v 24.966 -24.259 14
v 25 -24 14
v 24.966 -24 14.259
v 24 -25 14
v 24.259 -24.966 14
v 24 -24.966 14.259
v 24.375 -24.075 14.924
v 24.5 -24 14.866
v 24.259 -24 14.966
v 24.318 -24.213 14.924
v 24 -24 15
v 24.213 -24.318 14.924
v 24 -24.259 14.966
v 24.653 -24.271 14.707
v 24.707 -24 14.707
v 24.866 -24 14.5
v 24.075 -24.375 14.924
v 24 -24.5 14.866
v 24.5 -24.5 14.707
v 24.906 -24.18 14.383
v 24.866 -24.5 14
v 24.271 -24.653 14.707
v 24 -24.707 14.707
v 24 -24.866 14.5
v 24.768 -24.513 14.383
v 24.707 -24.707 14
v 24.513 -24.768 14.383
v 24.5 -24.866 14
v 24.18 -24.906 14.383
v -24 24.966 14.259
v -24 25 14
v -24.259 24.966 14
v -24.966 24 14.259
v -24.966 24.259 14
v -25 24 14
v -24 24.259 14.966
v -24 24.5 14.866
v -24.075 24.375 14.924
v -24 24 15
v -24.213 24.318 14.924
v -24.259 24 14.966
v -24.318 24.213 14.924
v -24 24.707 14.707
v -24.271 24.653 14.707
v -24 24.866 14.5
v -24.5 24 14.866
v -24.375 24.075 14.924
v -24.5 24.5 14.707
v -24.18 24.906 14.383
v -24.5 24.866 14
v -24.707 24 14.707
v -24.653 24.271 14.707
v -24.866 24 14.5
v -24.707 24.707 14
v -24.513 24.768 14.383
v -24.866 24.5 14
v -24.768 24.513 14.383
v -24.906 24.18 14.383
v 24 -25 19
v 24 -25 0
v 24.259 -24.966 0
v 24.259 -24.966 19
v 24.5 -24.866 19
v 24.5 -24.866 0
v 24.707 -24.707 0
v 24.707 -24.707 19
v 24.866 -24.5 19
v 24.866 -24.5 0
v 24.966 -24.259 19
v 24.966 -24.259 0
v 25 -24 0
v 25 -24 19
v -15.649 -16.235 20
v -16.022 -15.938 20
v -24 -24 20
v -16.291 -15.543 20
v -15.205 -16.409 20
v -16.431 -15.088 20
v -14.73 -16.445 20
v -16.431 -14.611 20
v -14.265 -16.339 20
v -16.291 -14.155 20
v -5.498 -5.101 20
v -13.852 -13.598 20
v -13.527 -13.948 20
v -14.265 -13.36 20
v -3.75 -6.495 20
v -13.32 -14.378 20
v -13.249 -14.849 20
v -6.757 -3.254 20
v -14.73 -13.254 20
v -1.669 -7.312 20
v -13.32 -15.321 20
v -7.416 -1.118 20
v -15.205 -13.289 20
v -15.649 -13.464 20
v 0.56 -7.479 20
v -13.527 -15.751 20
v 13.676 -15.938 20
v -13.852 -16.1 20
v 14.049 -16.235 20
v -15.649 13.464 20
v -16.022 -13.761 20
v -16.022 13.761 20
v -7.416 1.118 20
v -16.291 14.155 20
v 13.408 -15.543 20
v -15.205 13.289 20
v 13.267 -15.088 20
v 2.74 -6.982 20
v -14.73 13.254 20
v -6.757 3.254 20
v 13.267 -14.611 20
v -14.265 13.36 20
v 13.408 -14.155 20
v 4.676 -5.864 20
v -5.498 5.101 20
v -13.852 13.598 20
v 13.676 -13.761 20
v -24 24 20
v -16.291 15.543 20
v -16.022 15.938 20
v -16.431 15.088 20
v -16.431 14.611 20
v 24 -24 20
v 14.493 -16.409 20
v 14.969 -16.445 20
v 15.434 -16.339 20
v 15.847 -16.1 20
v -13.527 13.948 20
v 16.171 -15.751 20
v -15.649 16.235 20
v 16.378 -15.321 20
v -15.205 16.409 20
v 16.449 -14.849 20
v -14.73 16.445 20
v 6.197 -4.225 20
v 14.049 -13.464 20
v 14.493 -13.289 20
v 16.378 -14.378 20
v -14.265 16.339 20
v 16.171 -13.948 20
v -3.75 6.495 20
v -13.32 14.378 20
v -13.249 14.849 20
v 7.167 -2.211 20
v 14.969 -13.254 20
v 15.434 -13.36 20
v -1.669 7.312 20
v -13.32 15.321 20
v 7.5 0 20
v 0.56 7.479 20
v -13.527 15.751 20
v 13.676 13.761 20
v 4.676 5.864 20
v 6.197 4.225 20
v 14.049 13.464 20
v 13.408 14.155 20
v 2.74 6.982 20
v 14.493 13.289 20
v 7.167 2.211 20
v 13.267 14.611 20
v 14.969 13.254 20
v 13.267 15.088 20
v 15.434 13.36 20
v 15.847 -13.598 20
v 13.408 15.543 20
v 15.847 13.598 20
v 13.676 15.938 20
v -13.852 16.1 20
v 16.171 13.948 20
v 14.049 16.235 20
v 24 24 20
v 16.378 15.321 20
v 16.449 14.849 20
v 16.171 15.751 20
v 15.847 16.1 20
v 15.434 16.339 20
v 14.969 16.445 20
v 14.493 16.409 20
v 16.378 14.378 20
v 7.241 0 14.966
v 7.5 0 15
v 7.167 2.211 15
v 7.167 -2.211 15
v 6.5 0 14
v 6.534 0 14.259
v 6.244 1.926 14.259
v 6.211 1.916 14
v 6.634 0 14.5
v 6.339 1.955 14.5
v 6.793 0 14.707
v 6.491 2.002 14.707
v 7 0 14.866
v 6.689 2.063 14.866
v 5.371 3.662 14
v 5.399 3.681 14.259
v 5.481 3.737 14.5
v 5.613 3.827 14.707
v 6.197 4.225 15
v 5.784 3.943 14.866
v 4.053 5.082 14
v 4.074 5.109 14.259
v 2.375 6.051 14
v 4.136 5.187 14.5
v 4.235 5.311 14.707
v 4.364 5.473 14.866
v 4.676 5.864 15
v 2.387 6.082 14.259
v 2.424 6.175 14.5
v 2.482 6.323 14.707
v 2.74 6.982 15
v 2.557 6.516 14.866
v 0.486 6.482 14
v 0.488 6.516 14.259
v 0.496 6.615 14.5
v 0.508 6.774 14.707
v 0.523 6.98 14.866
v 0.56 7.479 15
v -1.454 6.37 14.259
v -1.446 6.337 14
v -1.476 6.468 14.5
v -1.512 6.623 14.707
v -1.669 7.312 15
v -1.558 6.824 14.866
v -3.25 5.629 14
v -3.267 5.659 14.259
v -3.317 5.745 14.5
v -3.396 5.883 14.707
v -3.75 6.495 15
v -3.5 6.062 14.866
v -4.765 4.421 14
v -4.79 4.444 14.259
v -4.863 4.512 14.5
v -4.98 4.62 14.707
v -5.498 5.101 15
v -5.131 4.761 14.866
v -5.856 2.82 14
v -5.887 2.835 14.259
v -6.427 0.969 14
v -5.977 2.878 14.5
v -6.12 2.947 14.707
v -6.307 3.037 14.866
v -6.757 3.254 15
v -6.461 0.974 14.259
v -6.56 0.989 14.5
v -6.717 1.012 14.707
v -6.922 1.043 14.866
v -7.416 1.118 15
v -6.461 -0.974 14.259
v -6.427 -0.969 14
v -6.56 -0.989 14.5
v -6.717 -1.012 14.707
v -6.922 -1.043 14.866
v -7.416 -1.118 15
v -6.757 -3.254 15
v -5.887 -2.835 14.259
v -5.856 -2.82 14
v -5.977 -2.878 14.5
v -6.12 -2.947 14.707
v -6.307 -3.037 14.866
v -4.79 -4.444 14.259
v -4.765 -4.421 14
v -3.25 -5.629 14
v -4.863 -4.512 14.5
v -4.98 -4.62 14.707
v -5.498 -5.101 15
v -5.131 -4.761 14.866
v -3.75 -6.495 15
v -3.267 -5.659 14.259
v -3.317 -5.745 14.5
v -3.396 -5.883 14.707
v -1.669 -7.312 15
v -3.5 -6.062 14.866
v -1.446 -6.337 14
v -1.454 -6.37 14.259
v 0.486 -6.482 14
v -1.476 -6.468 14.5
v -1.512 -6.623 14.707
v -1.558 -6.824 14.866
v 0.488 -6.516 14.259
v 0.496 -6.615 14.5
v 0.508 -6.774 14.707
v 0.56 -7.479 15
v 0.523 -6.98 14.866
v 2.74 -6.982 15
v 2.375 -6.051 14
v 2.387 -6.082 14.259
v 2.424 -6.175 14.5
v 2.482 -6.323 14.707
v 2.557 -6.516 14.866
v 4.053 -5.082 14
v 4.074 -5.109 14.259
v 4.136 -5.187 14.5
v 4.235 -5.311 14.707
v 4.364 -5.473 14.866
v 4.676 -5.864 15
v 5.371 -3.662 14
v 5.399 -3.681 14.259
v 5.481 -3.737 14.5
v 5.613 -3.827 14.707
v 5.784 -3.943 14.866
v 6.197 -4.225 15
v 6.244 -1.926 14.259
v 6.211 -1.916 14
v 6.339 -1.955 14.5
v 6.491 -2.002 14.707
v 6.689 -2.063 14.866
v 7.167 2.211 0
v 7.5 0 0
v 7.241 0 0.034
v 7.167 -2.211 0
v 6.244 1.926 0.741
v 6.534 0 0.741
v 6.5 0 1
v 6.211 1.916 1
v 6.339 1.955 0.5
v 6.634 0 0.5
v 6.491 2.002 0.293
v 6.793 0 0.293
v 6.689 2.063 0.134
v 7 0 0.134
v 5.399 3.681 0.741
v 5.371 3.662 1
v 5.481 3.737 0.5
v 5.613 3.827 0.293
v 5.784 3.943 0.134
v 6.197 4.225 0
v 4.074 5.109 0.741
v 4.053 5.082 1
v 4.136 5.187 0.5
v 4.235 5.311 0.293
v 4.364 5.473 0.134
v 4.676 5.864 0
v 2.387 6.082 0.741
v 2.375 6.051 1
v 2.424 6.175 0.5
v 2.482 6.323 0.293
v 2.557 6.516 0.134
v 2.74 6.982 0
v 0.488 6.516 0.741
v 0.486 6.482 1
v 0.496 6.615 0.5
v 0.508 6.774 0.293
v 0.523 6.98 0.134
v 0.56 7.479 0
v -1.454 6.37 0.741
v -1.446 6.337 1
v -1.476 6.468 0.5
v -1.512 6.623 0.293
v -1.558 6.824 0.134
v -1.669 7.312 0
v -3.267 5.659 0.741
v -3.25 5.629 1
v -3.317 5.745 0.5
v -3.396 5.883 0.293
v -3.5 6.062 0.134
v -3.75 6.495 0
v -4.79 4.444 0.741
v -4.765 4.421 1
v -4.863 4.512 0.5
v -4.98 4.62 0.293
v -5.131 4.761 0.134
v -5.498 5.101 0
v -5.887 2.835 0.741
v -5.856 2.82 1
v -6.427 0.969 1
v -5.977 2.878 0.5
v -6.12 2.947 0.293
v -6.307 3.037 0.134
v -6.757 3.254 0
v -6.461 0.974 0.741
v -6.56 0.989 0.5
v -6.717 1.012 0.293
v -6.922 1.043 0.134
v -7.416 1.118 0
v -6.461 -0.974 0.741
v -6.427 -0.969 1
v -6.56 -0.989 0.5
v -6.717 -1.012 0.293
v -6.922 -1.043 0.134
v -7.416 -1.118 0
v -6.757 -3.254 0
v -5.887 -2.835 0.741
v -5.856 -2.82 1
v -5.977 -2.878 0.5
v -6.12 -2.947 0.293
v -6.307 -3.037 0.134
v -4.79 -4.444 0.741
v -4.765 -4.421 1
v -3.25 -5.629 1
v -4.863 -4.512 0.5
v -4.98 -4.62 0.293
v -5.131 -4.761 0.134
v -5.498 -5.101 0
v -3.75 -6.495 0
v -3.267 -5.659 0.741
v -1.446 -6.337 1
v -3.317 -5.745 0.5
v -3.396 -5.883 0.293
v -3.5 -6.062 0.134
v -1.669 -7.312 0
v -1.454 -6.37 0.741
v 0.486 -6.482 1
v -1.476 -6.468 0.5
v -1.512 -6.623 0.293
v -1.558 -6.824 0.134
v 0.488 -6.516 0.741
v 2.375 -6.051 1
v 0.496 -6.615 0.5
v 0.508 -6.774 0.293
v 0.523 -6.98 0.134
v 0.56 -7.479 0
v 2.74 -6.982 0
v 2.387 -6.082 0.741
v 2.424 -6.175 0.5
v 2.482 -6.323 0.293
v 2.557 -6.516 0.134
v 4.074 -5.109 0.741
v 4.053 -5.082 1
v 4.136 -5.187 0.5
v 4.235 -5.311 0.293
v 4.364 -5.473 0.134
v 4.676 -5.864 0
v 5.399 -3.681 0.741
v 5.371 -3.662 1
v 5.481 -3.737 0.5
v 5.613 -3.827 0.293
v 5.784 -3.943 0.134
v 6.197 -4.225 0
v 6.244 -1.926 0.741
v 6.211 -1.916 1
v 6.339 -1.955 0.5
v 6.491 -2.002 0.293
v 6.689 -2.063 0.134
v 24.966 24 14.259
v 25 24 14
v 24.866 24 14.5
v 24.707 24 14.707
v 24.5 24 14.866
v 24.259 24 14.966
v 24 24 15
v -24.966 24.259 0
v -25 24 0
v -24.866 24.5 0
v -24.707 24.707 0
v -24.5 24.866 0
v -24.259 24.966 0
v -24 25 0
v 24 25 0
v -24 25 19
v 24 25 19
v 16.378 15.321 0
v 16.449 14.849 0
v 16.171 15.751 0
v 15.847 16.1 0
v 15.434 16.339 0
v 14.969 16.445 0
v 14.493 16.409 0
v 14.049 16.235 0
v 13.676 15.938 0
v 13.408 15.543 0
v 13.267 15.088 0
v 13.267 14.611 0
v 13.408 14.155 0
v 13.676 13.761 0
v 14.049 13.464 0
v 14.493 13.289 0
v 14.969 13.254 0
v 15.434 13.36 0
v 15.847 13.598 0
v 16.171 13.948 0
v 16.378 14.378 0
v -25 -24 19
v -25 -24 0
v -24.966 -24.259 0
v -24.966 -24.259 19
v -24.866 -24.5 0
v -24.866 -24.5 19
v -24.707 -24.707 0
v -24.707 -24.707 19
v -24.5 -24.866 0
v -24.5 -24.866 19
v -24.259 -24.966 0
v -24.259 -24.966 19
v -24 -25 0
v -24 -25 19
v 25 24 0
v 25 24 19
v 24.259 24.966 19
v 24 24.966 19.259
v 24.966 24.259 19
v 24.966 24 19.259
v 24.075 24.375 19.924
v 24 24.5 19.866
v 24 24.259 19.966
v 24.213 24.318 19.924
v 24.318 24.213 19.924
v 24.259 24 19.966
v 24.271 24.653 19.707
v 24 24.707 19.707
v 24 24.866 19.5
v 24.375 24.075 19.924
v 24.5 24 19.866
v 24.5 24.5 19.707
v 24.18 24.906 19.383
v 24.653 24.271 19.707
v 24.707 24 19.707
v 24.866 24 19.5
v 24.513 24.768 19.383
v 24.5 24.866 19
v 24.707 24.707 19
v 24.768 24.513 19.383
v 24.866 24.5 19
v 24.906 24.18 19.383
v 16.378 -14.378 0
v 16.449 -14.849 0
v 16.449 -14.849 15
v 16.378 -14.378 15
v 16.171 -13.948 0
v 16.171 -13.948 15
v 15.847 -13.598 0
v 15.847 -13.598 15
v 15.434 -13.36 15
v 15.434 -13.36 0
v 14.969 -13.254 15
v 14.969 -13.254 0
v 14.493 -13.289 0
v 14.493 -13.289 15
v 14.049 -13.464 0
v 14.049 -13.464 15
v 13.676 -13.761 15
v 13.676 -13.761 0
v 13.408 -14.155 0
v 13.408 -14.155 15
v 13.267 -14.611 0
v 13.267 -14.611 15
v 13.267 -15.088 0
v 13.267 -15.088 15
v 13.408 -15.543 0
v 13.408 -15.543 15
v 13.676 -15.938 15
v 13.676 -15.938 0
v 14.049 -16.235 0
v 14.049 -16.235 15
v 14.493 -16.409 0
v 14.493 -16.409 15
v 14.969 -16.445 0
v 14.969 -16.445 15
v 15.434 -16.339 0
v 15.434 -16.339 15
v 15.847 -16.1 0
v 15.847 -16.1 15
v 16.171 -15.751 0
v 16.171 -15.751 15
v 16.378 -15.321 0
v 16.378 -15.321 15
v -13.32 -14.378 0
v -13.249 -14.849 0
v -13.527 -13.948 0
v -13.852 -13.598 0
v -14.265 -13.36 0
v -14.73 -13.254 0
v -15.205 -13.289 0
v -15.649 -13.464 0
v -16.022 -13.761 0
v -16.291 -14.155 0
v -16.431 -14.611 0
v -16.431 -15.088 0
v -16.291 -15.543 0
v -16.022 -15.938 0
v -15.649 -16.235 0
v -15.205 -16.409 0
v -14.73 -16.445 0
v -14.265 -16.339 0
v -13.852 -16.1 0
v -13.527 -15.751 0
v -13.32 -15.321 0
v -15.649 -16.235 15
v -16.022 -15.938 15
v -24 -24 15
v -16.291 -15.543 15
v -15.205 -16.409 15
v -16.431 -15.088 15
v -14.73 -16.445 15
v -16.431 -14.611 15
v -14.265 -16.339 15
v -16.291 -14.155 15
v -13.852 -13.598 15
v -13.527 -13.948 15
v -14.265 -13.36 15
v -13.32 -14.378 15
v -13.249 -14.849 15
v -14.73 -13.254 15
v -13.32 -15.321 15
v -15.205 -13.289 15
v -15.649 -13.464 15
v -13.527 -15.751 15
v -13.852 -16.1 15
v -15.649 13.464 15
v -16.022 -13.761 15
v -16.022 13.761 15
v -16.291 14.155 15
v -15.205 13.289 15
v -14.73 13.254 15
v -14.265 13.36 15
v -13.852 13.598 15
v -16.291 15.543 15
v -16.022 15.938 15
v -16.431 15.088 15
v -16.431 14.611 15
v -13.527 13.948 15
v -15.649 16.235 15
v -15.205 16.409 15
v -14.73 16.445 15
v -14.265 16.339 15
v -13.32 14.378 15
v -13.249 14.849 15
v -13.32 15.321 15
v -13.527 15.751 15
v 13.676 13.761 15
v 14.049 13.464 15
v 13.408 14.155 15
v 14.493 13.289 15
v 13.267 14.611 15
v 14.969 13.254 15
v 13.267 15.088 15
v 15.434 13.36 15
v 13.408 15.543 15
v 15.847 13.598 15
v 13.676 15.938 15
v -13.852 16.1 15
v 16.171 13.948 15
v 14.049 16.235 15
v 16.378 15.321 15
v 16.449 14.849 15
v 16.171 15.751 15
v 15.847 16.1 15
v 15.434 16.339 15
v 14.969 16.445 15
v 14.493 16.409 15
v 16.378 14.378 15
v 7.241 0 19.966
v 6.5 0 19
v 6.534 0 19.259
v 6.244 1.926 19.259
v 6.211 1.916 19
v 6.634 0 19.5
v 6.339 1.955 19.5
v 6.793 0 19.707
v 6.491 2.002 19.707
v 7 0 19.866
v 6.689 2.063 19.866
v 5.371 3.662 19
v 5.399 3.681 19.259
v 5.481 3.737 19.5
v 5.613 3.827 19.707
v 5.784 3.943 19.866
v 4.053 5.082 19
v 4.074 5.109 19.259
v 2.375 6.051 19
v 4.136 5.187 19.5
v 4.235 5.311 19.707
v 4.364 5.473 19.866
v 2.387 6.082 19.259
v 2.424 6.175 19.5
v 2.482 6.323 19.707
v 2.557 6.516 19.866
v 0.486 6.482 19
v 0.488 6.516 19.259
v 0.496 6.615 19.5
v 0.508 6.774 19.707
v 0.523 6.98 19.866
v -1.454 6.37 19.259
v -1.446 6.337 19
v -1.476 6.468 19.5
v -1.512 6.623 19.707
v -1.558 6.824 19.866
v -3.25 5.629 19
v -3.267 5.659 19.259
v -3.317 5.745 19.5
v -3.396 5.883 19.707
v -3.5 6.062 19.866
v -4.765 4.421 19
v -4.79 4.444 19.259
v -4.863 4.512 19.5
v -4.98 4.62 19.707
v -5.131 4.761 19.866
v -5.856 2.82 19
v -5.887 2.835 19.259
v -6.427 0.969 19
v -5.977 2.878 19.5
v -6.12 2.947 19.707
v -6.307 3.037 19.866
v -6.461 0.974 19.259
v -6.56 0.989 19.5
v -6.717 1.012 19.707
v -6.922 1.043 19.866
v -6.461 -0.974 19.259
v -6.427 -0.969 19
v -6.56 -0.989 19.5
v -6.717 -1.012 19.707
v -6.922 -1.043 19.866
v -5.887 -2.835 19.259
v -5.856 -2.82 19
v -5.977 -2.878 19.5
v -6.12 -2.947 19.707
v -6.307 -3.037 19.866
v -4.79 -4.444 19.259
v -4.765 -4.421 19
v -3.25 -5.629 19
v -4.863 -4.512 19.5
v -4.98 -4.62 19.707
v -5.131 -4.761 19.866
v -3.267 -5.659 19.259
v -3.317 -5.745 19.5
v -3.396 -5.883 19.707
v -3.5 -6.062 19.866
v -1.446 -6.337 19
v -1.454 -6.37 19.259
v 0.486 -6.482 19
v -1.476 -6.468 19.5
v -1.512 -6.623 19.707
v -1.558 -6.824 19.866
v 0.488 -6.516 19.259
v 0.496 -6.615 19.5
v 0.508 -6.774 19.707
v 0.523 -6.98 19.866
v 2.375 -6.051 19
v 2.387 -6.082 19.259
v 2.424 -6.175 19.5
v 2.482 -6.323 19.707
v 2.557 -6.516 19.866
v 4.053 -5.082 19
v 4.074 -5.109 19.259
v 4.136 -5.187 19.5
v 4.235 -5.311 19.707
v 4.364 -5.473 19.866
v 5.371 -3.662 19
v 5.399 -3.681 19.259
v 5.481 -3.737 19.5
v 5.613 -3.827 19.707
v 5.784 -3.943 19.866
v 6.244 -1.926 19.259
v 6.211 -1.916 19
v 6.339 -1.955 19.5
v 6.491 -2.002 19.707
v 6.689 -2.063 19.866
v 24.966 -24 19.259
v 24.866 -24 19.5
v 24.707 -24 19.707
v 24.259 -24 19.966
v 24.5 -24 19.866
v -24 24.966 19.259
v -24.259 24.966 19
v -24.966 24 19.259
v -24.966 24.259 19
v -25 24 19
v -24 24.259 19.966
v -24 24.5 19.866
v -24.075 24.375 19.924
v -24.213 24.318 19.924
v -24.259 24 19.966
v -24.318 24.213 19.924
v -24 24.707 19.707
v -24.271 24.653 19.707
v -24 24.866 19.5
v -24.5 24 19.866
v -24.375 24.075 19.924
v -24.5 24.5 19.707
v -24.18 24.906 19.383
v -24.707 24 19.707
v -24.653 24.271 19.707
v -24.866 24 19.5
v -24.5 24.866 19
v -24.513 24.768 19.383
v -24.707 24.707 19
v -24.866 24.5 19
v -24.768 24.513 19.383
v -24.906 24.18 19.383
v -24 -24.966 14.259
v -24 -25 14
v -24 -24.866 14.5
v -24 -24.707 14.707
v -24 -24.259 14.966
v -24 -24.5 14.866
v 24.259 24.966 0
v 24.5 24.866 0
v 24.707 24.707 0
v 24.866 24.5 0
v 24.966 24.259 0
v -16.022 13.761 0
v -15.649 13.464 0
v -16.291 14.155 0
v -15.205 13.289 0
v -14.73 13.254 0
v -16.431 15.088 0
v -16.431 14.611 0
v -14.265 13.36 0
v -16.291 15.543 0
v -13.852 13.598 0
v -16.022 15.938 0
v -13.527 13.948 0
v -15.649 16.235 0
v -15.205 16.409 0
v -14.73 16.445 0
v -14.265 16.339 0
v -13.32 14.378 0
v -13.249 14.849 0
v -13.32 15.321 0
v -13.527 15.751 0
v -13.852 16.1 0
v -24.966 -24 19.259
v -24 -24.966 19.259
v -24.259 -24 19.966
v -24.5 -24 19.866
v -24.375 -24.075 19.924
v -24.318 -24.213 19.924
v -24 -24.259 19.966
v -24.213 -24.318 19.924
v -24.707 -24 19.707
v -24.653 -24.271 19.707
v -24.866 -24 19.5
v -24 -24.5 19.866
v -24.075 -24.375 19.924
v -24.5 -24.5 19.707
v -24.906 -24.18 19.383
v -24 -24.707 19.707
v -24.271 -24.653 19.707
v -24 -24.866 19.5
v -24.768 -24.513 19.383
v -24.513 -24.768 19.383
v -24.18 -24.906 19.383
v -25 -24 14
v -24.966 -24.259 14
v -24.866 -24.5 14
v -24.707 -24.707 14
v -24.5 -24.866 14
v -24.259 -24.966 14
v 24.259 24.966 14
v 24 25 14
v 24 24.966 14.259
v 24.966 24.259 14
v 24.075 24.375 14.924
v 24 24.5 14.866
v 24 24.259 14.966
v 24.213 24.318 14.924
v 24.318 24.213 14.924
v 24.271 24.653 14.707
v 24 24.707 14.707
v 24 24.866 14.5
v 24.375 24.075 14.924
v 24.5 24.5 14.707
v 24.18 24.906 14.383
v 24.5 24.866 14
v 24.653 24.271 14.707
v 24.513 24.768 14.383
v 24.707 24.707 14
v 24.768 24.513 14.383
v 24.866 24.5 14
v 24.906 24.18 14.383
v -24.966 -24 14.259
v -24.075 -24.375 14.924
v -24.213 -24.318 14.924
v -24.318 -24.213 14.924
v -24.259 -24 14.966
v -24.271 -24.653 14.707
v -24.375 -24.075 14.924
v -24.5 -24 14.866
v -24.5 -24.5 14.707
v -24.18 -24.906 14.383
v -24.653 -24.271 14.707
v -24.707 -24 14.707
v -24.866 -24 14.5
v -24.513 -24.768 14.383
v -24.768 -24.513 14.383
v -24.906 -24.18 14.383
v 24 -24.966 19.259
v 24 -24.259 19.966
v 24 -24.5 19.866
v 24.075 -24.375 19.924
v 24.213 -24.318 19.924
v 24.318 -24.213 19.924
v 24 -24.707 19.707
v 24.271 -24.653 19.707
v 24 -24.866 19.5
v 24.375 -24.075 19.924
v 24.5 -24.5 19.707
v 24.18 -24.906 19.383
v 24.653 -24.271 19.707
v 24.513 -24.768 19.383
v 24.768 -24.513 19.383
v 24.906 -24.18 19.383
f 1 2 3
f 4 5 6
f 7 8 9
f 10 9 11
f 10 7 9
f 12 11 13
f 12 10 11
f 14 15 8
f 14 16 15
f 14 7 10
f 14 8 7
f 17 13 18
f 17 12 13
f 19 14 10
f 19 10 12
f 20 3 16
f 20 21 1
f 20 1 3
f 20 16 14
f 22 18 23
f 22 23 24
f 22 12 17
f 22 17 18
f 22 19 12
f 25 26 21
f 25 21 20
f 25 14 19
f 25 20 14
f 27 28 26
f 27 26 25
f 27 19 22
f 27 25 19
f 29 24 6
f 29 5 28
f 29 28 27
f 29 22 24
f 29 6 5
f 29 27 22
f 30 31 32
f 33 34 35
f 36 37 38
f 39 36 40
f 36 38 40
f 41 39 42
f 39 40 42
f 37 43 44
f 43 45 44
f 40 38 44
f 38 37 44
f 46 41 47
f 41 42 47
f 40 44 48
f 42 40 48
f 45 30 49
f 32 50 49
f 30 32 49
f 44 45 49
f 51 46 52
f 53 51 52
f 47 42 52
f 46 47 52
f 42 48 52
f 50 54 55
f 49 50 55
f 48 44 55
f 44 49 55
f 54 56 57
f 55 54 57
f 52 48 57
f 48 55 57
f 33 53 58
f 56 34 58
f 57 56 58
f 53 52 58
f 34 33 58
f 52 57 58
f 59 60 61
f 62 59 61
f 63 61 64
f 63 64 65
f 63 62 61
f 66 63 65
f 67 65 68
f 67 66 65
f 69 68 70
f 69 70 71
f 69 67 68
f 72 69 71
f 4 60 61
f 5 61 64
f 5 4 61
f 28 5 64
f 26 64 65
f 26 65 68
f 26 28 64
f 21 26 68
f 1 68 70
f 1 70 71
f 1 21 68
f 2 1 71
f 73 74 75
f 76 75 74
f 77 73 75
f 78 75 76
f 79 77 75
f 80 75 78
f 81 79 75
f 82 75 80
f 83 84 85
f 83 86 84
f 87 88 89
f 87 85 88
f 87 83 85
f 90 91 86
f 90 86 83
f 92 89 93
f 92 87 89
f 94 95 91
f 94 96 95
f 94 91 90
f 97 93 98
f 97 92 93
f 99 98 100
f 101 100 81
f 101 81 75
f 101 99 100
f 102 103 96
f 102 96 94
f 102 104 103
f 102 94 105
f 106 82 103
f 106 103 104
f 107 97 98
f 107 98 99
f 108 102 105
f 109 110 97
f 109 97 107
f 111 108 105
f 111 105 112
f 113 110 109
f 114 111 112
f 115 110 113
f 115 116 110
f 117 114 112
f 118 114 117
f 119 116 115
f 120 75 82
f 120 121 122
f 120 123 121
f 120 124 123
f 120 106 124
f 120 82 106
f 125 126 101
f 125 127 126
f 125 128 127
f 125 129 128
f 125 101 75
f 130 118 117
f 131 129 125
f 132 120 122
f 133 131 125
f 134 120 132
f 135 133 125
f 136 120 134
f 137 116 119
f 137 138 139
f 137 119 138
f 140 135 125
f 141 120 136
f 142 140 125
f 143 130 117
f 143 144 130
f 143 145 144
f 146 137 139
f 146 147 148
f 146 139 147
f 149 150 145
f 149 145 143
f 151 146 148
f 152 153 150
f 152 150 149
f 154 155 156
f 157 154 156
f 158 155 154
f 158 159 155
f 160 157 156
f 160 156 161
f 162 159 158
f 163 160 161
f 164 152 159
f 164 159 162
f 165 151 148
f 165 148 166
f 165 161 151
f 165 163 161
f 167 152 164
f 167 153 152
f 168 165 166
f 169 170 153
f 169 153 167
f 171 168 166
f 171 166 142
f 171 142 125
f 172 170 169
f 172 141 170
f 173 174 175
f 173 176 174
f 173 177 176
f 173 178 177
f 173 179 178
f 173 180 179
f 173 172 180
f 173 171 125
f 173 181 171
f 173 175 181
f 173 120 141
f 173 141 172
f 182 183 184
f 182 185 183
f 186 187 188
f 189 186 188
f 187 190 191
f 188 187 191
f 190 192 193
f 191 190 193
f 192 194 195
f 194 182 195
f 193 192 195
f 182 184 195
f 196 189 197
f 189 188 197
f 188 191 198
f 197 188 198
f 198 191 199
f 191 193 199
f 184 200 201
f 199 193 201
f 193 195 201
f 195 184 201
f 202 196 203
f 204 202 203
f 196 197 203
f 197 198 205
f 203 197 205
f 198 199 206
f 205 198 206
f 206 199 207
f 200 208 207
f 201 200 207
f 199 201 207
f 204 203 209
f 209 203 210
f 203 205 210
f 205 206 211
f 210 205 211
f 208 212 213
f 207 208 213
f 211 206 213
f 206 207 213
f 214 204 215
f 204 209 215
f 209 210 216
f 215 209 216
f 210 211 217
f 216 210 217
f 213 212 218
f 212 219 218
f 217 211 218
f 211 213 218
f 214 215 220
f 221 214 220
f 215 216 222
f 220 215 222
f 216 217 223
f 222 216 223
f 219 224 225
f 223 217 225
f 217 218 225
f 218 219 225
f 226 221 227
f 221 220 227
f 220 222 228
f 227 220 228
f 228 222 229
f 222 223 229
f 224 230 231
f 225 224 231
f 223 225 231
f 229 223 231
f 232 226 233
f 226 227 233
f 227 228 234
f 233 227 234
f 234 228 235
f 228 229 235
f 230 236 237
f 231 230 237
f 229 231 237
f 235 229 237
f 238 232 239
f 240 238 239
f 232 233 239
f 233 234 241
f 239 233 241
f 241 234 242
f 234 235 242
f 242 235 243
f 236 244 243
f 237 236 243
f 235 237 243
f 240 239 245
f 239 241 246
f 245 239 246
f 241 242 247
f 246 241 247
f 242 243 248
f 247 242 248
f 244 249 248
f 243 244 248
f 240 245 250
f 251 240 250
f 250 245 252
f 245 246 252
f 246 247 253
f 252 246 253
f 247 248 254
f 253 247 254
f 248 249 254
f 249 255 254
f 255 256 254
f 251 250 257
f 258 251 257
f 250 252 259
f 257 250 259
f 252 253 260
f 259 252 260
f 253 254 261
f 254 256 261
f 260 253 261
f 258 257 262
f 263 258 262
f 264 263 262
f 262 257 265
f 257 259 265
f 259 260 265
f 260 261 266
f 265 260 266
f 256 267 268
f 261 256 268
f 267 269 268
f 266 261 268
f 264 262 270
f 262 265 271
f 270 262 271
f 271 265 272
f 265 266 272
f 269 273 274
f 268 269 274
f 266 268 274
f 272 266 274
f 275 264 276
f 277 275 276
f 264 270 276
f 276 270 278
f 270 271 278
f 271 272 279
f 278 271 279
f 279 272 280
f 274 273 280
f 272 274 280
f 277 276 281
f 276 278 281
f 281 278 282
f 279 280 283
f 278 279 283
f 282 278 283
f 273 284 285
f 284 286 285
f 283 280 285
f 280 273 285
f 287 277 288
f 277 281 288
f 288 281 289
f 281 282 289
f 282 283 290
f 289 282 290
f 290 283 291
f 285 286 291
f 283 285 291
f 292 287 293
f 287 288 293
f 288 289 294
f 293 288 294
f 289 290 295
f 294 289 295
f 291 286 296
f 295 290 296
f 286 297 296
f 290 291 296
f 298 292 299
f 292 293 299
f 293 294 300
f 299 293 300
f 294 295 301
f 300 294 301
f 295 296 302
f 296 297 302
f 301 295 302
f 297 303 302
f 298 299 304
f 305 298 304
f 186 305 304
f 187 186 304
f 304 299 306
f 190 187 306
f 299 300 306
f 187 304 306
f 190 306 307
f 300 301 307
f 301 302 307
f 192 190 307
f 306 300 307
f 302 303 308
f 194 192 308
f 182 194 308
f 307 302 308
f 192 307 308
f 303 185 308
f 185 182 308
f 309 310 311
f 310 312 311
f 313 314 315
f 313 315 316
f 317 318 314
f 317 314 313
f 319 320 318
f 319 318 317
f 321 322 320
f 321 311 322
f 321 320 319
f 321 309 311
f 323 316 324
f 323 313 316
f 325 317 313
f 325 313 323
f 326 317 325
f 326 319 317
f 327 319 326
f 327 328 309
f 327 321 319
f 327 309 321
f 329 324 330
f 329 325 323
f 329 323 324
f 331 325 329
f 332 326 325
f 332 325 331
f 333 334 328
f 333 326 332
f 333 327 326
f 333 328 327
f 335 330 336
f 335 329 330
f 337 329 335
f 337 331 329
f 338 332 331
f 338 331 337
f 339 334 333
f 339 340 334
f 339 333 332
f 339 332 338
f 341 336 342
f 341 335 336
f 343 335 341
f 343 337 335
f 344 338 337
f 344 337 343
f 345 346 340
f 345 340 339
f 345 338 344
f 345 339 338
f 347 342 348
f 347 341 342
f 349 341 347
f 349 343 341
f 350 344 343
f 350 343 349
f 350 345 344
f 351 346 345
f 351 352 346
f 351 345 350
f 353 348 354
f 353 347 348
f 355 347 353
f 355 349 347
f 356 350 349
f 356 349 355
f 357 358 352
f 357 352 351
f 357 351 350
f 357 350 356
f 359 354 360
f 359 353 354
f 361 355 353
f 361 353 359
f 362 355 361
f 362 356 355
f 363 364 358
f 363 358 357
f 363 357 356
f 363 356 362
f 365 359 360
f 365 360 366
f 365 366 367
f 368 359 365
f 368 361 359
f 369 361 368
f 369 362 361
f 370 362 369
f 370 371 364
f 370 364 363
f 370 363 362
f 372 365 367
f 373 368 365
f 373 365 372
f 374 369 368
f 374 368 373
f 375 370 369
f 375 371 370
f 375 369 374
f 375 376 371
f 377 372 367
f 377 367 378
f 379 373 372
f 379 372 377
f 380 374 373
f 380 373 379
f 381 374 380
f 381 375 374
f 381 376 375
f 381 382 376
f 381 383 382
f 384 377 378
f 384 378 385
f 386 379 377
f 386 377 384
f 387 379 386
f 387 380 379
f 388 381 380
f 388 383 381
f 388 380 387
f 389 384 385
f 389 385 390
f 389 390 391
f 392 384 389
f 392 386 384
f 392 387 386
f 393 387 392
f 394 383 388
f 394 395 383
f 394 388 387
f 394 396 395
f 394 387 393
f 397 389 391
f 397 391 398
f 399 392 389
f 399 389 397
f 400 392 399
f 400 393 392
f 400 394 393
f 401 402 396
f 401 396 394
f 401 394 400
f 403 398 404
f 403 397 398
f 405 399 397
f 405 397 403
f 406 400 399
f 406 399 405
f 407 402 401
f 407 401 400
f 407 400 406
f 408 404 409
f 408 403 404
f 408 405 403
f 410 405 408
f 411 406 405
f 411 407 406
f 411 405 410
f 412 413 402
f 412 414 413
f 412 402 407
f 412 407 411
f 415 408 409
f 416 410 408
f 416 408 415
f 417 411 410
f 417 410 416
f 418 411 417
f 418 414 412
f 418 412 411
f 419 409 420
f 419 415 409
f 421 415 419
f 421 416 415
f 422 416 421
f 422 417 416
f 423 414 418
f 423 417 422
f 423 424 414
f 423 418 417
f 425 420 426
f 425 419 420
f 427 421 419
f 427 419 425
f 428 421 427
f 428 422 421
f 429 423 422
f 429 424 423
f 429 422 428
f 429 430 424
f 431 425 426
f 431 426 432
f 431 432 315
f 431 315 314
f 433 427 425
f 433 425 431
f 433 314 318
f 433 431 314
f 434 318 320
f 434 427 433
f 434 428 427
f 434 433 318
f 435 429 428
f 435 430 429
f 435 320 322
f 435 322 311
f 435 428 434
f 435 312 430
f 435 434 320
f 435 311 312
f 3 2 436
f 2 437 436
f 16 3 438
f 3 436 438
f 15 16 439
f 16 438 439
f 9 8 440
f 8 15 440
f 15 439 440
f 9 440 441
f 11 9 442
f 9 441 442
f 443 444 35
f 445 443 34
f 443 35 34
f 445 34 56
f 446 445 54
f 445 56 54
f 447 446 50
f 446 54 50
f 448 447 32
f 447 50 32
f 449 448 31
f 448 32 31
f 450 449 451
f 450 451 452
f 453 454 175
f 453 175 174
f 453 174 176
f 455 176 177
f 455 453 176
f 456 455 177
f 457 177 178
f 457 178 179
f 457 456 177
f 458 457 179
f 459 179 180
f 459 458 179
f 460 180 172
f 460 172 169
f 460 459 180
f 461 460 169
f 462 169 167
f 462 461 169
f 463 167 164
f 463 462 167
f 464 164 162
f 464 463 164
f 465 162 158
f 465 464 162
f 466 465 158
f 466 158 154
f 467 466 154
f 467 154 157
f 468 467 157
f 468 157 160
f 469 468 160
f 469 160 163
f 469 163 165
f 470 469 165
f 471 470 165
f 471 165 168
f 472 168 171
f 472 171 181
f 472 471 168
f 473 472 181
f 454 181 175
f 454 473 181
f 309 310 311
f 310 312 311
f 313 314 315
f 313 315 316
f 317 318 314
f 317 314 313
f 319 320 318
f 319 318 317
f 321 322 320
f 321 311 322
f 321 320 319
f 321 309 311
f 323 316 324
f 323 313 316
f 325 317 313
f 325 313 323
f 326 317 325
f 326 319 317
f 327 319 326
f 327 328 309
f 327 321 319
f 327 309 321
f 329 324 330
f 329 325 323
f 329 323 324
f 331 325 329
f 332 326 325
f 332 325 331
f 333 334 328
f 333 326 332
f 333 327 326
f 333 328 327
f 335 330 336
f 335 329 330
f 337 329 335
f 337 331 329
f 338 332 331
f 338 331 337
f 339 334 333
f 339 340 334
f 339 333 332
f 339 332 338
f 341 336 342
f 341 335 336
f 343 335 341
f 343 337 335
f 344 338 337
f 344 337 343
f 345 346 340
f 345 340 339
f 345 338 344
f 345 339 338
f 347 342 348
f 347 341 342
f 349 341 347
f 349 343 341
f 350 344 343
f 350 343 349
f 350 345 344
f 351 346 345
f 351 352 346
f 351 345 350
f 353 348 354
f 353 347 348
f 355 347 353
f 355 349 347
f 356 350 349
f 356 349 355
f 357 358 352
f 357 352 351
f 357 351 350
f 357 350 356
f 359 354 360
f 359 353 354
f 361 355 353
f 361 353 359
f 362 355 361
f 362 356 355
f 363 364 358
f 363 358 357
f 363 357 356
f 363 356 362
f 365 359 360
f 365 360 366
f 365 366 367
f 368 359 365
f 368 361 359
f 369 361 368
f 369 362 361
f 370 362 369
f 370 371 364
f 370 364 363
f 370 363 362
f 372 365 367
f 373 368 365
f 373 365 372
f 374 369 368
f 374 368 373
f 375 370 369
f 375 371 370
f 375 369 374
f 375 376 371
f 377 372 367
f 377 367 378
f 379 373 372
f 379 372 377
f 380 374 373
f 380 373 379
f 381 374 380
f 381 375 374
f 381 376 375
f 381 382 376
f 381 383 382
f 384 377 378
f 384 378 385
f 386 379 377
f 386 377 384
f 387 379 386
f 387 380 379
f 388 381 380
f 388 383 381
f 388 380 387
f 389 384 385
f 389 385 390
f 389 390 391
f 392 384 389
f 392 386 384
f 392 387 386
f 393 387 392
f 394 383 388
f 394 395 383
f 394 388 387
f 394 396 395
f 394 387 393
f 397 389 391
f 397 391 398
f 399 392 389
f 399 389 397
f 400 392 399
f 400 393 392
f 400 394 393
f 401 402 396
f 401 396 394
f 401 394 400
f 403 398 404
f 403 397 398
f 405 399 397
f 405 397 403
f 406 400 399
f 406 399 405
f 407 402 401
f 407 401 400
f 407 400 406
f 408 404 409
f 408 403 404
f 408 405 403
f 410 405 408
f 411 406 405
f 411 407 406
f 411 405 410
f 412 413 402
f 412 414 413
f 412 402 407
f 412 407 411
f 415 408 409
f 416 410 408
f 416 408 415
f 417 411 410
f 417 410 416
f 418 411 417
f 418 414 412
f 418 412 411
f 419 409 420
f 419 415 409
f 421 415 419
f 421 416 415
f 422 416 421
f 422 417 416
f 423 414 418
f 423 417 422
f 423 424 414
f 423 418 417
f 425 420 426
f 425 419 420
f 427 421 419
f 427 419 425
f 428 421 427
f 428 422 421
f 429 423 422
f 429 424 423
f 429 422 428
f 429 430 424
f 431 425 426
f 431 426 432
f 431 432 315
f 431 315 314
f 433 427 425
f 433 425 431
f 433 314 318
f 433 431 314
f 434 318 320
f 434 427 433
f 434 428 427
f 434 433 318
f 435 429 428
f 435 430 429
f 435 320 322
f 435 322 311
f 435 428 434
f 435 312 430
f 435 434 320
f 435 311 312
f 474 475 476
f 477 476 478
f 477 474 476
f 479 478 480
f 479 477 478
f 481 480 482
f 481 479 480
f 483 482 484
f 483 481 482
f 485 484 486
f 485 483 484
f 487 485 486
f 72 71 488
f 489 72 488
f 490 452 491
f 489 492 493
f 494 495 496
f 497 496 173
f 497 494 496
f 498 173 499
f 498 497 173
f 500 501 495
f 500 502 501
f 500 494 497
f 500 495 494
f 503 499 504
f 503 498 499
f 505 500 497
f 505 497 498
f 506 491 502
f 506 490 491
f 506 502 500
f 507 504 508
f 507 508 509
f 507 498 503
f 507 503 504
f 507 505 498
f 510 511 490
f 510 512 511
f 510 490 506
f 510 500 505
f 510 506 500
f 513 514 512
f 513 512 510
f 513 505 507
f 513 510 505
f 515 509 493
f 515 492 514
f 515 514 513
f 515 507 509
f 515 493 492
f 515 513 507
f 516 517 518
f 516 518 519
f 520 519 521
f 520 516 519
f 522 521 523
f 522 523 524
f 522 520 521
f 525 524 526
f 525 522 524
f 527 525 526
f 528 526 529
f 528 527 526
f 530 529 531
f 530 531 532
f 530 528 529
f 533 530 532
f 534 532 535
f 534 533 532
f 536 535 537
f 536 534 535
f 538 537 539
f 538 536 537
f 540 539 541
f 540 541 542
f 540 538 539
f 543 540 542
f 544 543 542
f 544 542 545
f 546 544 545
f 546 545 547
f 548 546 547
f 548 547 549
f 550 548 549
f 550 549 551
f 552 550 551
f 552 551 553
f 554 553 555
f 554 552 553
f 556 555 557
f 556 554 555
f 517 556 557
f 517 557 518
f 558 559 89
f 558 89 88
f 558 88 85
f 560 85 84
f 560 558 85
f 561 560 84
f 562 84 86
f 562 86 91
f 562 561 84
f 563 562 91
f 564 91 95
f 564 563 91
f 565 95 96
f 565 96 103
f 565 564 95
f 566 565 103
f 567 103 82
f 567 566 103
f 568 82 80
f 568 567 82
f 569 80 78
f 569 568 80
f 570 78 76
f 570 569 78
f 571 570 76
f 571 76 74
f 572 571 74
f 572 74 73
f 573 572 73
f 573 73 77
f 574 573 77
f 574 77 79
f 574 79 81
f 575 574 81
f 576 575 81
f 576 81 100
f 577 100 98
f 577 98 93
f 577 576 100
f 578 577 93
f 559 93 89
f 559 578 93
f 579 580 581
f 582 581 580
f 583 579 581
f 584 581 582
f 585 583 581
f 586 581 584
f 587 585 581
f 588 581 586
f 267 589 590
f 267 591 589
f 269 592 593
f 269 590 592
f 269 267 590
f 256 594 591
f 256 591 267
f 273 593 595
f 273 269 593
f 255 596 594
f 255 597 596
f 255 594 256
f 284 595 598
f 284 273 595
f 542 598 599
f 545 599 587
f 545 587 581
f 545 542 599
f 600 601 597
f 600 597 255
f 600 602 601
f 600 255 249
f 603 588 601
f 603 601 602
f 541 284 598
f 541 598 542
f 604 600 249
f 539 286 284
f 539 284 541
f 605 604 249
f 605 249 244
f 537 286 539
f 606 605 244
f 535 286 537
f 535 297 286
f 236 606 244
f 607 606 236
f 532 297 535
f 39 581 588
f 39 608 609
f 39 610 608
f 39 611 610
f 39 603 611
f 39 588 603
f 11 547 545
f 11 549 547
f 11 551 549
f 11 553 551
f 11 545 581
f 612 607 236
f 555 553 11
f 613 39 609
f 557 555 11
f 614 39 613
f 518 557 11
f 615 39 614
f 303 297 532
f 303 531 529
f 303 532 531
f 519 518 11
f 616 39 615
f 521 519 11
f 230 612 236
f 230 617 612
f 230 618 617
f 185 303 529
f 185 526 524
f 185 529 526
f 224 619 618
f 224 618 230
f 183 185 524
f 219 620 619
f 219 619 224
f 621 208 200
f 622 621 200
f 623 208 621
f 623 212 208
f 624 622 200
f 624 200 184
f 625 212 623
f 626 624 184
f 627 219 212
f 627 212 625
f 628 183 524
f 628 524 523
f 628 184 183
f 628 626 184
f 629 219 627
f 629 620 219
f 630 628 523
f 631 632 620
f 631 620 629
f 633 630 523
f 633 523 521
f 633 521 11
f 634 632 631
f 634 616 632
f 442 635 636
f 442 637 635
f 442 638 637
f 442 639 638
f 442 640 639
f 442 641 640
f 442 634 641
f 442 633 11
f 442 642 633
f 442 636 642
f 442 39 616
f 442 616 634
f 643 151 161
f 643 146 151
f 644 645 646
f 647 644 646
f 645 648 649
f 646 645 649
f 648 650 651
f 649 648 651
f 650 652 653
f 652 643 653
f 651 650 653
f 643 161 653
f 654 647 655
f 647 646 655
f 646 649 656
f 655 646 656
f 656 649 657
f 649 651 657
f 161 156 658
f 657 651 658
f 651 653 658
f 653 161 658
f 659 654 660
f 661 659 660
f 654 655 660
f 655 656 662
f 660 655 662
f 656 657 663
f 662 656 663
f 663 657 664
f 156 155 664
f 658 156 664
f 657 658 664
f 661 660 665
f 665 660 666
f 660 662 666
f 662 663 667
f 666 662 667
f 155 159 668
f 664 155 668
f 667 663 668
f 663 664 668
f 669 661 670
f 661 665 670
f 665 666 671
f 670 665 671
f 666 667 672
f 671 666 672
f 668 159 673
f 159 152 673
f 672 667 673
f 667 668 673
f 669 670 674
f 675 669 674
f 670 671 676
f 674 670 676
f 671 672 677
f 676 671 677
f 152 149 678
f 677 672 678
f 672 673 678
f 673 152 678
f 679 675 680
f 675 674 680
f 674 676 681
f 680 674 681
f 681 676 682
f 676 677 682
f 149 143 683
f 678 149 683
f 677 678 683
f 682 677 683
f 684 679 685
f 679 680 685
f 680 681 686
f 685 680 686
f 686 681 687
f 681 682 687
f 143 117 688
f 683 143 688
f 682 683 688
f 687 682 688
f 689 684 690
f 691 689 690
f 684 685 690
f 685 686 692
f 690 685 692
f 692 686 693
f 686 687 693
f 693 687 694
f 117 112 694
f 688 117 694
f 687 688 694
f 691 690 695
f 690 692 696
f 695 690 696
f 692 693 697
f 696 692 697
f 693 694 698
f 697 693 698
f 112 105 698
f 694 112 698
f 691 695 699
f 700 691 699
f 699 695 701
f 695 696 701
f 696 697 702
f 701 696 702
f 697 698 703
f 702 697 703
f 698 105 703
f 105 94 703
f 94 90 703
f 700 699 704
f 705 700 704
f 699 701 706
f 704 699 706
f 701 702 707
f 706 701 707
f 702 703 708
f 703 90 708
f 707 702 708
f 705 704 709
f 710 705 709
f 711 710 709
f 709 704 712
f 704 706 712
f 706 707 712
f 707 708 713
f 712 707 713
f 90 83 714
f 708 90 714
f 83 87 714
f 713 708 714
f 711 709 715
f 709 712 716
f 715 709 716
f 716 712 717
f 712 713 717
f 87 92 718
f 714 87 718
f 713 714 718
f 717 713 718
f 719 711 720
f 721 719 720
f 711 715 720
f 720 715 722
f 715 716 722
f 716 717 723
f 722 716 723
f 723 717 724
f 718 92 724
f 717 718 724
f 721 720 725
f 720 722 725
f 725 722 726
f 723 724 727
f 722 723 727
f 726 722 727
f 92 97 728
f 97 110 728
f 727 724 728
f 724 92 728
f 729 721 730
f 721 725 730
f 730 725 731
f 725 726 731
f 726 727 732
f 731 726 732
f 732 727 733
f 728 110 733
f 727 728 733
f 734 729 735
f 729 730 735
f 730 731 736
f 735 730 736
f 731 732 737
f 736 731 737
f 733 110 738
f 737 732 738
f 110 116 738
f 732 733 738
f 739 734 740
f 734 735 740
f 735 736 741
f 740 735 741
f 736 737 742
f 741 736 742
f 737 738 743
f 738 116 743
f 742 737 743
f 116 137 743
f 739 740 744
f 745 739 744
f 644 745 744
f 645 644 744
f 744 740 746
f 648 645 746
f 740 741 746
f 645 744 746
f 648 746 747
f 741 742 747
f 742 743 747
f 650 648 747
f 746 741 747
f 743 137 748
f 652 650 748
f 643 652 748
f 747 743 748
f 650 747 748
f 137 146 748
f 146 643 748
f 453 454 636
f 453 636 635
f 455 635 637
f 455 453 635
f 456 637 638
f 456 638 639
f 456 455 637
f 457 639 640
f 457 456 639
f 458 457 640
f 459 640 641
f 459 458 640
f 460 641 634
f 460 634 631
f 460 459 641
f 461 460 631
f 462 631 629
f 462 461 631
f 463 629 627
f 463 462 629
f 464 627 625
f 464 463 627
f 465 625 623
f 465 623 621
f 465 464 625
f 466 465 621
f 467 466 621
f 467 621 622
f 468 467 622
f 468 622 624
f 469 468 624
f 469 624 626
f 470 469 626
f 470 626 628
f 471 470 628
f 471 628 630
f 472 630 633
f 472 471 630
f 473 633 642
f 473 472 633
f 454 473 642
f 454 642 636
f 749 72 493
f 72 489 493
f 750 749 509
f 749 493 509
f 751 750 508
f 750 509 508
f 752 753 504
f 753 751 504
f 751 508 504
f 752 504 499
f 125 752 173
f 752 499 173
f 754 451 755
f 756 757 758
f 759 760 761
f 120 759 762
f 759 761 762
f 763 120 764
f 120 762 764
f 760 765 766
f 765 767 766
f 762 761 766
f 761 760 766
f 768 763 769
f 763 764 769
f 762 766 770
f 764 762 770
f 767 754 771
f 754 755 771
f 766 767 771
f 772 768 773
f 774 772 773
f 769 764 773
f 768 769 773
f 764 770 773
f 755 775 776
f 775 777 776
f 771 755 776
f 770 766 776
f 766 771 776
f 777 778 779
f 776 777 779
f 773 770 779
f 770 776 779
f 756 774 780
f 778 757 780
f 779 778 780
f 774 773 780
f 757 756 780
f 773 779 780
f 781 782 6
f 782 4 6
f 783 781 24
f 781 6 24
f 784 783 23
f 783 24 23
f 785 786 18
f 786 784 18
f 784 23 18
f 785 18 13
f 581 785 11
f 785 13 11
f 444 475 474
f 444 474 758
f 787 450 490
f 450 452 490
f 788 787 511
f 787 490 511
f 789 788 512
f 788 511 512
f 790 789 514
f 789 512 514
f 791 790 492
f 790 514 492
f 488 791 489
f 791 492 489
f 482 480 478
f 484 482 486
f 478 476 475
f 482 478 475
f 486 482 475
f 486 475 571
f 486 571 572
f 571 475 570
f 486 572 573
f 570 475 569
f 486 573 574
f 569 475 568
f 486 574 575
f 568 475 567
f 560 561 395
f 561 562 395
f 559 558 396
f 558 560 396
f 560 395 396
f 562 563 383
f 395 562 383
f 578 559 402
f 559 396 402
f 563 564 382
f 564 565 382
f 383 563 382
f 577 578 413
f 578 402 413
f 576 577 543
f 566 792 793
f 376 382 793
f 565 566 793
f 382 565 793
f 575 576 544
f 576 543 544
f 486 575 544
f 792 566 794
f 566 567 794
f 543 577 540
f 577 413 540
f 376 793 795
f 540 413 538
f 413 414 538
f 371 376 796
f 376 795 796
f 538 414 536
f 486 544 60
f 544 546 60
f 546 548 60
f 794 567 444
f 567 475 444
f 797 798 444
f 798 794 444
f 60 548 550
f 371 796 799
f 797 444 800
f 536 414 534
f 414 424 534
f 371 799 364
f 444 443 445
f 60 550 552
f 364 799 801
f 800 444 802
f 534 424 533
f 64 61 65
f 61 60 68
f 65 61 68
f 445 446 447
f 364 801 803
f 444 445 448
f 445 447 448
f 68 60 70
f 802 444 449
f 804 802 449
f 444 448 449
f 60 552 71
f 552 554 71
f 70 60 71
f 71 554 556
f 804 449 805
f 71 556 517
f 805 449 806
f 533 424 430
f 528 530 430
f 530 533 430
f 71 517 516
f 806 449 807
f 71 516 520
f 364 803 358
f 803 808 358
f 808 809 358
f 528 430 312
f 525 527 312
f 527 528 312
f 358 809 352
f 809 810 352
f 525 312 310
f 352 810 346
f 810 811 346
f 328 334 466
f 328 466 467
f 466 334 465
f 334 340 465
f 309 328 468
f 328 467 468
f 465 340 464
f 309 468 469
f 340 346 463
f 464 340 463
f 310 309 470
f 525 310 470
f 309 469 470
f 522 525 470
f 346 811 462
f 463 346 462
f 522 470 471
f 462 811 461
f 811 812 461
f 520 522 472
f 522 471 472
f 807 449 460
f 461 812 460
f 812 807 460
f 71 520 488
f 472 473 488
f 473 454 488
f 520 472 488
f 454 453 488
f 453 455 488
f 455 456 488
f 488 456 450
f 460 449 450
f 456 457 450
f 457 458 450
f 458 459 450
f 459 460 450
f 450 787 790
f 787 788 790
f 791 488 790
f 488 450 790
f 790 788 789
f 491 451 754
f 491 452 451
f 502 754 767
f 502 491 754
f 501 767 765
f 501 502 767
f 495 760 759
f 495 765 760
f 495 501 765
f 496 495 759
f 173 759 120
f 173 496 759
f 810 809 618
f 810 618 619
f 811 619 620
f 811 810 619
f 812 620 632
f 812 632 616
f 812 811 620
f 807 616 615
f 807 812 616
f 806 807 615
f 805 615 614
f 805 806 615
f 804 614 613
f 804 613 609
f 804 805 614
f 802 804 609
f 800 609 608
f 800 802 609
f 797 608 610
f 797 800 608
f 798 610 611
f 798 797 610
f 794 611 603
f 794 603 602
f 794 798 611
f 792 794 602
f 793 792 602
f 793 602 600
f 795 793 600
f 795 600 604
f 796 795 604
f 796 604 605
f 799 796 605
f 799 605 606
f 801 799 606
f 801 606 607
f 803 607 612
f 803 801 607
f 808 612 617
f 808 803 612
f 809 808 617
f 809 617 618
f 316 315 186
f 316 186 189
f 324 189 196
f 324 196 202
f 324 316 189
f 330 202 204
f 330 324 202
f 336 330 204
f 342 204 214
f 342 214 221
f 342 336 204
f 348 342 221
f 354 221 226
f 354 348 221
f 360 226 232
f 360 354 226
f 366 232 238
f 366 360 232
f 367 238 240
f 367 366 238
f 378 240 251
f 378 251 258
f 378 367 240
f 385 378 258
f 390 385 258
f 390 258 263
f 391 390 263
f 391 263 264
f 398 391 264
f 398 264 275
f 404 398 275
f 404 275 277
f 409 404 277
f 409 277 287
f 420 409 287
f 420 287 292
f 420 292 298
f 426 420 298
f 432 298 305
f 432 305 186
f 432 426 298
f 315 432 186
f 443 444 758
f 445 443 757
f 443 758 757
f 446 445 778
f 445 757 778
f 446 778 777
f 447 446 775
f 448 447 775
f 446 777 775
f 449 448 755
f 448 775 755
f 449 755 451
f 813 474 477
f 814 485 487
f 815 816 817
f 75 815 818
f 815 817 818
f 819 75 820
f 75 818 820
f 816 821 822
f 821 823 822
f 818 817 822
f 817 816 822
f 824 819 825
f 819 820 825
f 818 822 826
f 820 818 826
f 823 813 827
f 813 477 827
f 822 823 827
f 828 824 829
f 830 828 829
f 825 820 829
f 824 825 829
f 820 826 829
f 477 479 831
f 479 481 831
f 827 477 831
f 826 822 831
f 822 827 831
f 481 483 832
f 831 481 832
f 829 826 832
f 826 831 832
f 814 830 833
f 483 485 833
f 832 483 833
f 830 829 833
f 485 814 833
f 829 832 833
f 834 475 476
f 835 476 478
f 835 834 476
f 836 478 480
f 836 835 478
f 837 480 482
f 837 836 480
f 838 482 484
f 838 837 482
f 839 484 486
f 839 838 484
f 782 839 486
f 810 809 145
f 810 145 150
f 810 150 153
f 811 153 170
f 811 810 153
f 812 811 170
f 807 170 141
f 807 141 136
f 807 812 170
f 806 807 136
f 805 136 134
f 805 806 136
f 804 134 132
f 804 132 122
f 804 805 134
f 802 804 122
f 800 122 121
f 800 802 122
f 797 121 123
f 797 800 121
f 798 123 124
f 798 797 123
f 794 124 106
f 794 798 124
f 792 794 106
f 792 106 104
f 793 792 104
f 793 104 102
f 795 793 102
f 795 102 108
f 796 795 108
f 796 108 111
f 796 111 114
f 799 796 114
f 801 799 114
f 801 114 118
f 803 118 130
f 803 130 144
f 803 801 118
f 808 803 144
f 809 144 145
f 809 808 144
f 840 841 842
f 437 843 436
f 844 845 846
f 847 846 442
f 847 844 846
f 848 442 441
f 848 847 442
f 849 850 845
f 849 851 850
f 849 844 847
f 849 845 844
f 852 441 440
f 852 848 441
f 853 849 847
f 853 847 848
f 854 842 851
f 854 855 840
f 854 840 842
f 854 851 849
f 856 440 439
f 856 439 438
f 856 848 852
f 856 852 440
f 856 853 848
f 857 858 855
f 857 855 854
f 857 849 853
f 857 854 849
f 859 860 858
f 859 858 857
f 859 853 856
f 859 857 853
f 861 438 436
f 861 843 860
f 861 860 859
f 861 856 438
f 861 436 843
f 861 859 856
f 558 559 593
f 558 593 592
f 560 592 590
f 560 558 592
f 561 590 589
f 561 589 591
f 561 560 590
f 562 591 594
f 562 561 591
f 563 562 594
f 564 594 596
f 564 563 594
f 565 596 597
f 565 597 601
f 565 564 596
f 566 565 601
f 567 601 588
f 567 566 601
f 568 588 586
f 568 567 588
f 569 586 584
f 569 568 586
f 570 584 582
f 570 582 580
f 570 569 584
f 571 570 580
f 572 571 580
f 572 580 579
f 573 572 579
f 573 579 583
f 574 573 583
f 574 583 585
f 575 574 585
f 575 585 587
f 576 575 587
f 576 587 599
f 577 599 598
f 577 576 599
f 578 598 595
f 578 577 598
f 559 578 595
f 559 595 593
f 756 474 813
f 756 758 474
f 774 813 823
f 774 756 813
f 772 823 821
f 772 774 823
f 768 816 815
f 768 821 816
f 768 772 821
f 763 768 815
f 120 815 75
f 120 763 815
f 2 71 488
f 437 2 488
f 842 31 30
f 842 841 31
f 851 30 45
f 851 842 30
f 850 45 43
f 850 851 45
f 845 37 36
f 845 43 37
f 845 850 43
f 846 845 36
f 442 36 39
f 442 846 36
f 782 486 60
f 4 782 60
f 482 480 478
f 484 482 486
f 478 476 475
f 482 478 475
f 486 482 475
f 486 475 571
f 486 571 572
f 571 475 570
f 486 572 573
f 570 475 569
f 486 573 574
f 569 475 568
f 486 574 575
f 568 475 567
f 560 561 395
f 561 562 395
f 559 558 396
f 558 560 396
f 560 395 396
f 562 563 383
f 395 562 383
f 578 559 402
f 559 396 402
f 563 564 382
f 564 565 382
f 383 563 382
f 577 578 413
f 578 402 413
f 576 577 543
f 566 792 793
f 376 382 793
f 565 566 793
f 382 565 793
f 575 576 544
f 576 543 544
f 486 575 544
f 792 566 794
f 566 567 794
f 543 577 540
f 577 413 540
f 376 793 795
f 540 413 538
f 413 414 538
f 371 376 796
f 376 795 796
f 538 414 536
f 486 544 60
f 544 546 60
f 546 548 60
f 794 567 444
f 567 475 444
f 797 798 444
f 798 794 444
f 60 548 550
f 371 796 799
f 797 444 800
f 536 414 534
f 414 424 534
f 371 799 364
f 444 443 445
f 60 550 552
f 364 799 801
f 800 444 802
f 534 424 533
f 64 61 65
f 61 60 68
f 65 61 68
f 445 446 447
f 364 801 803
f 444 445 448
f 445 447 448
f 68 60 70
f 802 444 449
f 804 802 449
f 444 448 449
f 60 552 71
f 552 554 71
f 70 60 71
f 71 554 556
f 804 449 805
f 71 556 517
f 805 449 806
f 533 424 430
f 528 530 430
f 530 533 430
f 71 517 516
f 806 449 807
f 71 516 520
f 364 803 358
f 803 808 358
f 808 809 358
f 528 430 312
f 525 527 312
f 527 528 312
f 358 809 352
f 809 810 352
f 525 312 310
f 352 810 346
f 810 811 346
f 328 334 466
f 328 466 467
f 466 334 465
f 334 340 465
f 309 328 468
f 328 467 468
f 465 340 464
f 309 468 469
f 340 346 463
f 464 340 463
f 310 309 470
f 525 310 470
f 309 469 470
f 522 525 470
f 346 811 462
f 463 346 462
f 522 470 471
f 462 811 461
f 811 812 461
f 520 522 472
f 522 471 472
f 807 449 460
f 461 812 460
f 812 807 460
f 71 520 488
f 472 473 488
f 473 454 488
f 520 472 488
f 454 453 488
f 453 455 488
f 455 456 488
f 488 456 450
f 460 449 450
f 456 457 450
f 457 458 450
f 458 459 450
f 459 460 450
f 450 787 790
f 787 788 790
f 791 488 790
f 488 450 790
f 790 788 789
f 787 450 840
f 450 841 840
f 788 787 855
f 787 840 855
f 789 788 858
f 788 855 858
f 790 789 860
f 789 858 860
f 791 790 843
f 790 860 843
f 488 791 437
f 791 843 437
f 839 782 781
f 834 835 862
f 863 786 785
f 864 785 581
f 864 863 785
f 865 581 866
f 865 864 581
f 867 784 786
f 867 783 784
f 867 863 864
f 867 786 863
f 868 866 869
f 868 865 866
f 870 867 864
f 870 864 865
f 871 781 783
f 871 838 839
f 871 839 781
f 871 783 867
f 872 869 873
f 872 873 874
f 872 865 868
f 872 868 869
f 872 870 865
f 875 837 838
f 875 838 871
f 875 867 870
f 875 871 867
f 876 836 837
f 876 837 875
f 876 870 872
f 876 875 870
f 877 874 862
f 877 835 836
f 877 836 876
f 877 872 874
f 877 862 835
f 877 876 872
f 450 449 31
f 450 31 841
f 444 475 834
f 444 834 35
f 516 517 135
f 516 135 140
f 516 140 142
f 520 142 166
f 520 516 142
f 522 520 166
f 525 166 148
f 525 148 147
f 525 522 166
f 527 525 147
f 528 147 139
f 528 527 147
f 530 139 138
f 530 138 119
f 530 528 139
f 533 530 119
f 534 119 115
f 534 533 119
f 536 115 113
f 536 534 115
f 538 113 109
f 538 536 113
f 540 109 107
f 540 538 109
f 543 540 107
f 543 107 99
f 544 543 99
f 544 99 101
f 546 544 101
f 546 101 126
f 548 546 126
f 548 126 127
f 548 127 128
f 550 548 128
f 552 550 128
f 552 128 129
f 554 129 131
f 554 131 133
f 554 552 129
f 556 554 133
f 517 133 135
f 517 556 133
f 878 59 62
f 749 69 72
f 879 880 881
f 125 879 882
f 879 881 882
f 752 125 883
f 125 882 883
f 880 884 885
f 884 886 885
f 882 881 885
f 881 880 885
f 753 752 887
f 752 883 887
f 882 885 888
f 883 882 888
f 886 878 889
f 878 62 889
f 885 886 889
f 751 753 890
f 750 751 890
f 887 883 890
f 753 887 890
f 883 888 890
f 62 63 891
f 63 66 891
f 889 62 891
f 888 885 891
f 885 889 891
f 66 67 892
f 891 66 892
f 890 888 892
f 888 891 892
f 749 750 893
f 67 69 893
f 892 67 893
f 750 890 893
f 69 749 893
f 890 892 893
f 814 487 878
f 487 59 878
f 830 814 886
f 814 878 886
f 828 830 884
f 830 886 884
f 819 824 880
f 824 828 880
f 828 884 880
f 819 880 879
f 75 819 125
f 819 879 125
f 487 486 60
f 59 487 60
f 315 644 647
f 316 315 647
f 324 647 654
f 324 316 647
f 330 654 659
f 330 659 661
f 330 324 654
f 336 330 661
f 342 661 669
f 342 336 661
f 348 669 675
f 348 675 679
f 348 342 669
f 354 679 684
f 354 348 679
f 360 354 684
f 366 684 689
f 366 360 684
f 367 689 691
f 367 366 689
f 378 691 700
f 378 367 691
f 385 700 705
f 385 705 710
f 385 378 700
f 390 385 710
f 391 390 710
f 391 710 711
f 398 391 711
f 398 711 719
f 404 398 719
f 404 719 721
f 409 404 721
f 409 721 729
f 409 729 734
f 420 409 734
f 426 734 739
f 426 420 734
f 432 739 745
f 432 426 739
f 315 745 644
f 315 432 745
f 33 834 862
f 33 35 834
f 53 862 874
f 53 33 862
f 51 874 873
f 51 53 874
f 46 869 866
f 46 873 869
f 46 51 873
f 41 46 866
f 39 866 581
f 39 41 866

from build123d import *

# Parameters (mm, degrees)
F0_W     = 50
F0_H     = 50
F0_R     = 1.6
F0_R_2   = 6.5
F1_DEPTH = 15
F2_R     = 1
F3_DEPTH = 20
F4_R     = 1


with BuildPart() as f1:
    # F0 (on Top) → F1 (new body)
    with BuildSketch(Plane.XY):
        Rectangle(F0_W, F0_H)
        with Locations((-14.849242, -14.849242)):
            Circle(F0_R, mode=Mode.SUBTRACT)
        with Locations((14.849242, -14.849242)):
            Circle(F0_R, mode=Mode.SUBTRACT)
        with Locations((-14.849242, 14.849242)):
            Circle(F0_R, mode=Mode.SUBTRACT)
        Circle(F0_R_2, mode=Mode.SUBTRACT)
        with Locations((14.849242, 14.849242)):
            Circle(F0_R, mode=Mode.SUBTRACT)
    extrude(amount=F1_DEPTH)

    # F2
    f2_edges = [f1.edges().sort_by_distance(p)[0] for p in [
        (-25, -25, 7.5),
        (25, -25, 7.5),
        (25, 25, 7.5),
        (-25, 25, 7.5),
        (0, 25, 15),
        (25, 0, 15),
        (0, -25, 15),
        (-25, 0, 15),
        (-6.5, 0, 15),
        (-6.5, 0, 0),
    ]]
    fillet(f2_edges, radius=F2_R)


with BuildPart() as f3:
    # F0 (on Top) → F3 (new body)
    with BuildSketch(Plane.XY):
        Rectangle(F0_W, F0_H)
        with Locations((-14.849242, -14.849242)):
            Circle(F0_R, mode=Mode.SUBTRACT)
        with Locations((14.849242, -14.849242)):
            Circle(F0_R, mode=Mode.SUBTRACT)
        with Locations((-14.849242, 14.849242)):
            Circle(F0_R, mode=Mode.SUBTRACT)
        Circle(F0_R_2, mode=Mode.SUBTRACT)
        with Locations((14.849242, 14.849242)):
            Circle(F0_R, mode=Mode.SUBTRACT)
    extrude(amount=F3_DEPTH)

    # F4
    f4_edges = [f3.edges().sort_by_distance(p)[0] for p in [
        (-25, -25, 10),
        (25, -25, 10),
        (25, 25, 10),
        (-25, 25, 10),
        (0, 25, 20),
        (-25, 0, 20),
        (0, -25, 20),
        (25, 0, 20),
        (-6.5, 0, 20),
        (-6.5, 0, 0),
    ]]
    fillet(f4_edges, radius=F4_R)


solid = Compound([f1.part, f3.part])
